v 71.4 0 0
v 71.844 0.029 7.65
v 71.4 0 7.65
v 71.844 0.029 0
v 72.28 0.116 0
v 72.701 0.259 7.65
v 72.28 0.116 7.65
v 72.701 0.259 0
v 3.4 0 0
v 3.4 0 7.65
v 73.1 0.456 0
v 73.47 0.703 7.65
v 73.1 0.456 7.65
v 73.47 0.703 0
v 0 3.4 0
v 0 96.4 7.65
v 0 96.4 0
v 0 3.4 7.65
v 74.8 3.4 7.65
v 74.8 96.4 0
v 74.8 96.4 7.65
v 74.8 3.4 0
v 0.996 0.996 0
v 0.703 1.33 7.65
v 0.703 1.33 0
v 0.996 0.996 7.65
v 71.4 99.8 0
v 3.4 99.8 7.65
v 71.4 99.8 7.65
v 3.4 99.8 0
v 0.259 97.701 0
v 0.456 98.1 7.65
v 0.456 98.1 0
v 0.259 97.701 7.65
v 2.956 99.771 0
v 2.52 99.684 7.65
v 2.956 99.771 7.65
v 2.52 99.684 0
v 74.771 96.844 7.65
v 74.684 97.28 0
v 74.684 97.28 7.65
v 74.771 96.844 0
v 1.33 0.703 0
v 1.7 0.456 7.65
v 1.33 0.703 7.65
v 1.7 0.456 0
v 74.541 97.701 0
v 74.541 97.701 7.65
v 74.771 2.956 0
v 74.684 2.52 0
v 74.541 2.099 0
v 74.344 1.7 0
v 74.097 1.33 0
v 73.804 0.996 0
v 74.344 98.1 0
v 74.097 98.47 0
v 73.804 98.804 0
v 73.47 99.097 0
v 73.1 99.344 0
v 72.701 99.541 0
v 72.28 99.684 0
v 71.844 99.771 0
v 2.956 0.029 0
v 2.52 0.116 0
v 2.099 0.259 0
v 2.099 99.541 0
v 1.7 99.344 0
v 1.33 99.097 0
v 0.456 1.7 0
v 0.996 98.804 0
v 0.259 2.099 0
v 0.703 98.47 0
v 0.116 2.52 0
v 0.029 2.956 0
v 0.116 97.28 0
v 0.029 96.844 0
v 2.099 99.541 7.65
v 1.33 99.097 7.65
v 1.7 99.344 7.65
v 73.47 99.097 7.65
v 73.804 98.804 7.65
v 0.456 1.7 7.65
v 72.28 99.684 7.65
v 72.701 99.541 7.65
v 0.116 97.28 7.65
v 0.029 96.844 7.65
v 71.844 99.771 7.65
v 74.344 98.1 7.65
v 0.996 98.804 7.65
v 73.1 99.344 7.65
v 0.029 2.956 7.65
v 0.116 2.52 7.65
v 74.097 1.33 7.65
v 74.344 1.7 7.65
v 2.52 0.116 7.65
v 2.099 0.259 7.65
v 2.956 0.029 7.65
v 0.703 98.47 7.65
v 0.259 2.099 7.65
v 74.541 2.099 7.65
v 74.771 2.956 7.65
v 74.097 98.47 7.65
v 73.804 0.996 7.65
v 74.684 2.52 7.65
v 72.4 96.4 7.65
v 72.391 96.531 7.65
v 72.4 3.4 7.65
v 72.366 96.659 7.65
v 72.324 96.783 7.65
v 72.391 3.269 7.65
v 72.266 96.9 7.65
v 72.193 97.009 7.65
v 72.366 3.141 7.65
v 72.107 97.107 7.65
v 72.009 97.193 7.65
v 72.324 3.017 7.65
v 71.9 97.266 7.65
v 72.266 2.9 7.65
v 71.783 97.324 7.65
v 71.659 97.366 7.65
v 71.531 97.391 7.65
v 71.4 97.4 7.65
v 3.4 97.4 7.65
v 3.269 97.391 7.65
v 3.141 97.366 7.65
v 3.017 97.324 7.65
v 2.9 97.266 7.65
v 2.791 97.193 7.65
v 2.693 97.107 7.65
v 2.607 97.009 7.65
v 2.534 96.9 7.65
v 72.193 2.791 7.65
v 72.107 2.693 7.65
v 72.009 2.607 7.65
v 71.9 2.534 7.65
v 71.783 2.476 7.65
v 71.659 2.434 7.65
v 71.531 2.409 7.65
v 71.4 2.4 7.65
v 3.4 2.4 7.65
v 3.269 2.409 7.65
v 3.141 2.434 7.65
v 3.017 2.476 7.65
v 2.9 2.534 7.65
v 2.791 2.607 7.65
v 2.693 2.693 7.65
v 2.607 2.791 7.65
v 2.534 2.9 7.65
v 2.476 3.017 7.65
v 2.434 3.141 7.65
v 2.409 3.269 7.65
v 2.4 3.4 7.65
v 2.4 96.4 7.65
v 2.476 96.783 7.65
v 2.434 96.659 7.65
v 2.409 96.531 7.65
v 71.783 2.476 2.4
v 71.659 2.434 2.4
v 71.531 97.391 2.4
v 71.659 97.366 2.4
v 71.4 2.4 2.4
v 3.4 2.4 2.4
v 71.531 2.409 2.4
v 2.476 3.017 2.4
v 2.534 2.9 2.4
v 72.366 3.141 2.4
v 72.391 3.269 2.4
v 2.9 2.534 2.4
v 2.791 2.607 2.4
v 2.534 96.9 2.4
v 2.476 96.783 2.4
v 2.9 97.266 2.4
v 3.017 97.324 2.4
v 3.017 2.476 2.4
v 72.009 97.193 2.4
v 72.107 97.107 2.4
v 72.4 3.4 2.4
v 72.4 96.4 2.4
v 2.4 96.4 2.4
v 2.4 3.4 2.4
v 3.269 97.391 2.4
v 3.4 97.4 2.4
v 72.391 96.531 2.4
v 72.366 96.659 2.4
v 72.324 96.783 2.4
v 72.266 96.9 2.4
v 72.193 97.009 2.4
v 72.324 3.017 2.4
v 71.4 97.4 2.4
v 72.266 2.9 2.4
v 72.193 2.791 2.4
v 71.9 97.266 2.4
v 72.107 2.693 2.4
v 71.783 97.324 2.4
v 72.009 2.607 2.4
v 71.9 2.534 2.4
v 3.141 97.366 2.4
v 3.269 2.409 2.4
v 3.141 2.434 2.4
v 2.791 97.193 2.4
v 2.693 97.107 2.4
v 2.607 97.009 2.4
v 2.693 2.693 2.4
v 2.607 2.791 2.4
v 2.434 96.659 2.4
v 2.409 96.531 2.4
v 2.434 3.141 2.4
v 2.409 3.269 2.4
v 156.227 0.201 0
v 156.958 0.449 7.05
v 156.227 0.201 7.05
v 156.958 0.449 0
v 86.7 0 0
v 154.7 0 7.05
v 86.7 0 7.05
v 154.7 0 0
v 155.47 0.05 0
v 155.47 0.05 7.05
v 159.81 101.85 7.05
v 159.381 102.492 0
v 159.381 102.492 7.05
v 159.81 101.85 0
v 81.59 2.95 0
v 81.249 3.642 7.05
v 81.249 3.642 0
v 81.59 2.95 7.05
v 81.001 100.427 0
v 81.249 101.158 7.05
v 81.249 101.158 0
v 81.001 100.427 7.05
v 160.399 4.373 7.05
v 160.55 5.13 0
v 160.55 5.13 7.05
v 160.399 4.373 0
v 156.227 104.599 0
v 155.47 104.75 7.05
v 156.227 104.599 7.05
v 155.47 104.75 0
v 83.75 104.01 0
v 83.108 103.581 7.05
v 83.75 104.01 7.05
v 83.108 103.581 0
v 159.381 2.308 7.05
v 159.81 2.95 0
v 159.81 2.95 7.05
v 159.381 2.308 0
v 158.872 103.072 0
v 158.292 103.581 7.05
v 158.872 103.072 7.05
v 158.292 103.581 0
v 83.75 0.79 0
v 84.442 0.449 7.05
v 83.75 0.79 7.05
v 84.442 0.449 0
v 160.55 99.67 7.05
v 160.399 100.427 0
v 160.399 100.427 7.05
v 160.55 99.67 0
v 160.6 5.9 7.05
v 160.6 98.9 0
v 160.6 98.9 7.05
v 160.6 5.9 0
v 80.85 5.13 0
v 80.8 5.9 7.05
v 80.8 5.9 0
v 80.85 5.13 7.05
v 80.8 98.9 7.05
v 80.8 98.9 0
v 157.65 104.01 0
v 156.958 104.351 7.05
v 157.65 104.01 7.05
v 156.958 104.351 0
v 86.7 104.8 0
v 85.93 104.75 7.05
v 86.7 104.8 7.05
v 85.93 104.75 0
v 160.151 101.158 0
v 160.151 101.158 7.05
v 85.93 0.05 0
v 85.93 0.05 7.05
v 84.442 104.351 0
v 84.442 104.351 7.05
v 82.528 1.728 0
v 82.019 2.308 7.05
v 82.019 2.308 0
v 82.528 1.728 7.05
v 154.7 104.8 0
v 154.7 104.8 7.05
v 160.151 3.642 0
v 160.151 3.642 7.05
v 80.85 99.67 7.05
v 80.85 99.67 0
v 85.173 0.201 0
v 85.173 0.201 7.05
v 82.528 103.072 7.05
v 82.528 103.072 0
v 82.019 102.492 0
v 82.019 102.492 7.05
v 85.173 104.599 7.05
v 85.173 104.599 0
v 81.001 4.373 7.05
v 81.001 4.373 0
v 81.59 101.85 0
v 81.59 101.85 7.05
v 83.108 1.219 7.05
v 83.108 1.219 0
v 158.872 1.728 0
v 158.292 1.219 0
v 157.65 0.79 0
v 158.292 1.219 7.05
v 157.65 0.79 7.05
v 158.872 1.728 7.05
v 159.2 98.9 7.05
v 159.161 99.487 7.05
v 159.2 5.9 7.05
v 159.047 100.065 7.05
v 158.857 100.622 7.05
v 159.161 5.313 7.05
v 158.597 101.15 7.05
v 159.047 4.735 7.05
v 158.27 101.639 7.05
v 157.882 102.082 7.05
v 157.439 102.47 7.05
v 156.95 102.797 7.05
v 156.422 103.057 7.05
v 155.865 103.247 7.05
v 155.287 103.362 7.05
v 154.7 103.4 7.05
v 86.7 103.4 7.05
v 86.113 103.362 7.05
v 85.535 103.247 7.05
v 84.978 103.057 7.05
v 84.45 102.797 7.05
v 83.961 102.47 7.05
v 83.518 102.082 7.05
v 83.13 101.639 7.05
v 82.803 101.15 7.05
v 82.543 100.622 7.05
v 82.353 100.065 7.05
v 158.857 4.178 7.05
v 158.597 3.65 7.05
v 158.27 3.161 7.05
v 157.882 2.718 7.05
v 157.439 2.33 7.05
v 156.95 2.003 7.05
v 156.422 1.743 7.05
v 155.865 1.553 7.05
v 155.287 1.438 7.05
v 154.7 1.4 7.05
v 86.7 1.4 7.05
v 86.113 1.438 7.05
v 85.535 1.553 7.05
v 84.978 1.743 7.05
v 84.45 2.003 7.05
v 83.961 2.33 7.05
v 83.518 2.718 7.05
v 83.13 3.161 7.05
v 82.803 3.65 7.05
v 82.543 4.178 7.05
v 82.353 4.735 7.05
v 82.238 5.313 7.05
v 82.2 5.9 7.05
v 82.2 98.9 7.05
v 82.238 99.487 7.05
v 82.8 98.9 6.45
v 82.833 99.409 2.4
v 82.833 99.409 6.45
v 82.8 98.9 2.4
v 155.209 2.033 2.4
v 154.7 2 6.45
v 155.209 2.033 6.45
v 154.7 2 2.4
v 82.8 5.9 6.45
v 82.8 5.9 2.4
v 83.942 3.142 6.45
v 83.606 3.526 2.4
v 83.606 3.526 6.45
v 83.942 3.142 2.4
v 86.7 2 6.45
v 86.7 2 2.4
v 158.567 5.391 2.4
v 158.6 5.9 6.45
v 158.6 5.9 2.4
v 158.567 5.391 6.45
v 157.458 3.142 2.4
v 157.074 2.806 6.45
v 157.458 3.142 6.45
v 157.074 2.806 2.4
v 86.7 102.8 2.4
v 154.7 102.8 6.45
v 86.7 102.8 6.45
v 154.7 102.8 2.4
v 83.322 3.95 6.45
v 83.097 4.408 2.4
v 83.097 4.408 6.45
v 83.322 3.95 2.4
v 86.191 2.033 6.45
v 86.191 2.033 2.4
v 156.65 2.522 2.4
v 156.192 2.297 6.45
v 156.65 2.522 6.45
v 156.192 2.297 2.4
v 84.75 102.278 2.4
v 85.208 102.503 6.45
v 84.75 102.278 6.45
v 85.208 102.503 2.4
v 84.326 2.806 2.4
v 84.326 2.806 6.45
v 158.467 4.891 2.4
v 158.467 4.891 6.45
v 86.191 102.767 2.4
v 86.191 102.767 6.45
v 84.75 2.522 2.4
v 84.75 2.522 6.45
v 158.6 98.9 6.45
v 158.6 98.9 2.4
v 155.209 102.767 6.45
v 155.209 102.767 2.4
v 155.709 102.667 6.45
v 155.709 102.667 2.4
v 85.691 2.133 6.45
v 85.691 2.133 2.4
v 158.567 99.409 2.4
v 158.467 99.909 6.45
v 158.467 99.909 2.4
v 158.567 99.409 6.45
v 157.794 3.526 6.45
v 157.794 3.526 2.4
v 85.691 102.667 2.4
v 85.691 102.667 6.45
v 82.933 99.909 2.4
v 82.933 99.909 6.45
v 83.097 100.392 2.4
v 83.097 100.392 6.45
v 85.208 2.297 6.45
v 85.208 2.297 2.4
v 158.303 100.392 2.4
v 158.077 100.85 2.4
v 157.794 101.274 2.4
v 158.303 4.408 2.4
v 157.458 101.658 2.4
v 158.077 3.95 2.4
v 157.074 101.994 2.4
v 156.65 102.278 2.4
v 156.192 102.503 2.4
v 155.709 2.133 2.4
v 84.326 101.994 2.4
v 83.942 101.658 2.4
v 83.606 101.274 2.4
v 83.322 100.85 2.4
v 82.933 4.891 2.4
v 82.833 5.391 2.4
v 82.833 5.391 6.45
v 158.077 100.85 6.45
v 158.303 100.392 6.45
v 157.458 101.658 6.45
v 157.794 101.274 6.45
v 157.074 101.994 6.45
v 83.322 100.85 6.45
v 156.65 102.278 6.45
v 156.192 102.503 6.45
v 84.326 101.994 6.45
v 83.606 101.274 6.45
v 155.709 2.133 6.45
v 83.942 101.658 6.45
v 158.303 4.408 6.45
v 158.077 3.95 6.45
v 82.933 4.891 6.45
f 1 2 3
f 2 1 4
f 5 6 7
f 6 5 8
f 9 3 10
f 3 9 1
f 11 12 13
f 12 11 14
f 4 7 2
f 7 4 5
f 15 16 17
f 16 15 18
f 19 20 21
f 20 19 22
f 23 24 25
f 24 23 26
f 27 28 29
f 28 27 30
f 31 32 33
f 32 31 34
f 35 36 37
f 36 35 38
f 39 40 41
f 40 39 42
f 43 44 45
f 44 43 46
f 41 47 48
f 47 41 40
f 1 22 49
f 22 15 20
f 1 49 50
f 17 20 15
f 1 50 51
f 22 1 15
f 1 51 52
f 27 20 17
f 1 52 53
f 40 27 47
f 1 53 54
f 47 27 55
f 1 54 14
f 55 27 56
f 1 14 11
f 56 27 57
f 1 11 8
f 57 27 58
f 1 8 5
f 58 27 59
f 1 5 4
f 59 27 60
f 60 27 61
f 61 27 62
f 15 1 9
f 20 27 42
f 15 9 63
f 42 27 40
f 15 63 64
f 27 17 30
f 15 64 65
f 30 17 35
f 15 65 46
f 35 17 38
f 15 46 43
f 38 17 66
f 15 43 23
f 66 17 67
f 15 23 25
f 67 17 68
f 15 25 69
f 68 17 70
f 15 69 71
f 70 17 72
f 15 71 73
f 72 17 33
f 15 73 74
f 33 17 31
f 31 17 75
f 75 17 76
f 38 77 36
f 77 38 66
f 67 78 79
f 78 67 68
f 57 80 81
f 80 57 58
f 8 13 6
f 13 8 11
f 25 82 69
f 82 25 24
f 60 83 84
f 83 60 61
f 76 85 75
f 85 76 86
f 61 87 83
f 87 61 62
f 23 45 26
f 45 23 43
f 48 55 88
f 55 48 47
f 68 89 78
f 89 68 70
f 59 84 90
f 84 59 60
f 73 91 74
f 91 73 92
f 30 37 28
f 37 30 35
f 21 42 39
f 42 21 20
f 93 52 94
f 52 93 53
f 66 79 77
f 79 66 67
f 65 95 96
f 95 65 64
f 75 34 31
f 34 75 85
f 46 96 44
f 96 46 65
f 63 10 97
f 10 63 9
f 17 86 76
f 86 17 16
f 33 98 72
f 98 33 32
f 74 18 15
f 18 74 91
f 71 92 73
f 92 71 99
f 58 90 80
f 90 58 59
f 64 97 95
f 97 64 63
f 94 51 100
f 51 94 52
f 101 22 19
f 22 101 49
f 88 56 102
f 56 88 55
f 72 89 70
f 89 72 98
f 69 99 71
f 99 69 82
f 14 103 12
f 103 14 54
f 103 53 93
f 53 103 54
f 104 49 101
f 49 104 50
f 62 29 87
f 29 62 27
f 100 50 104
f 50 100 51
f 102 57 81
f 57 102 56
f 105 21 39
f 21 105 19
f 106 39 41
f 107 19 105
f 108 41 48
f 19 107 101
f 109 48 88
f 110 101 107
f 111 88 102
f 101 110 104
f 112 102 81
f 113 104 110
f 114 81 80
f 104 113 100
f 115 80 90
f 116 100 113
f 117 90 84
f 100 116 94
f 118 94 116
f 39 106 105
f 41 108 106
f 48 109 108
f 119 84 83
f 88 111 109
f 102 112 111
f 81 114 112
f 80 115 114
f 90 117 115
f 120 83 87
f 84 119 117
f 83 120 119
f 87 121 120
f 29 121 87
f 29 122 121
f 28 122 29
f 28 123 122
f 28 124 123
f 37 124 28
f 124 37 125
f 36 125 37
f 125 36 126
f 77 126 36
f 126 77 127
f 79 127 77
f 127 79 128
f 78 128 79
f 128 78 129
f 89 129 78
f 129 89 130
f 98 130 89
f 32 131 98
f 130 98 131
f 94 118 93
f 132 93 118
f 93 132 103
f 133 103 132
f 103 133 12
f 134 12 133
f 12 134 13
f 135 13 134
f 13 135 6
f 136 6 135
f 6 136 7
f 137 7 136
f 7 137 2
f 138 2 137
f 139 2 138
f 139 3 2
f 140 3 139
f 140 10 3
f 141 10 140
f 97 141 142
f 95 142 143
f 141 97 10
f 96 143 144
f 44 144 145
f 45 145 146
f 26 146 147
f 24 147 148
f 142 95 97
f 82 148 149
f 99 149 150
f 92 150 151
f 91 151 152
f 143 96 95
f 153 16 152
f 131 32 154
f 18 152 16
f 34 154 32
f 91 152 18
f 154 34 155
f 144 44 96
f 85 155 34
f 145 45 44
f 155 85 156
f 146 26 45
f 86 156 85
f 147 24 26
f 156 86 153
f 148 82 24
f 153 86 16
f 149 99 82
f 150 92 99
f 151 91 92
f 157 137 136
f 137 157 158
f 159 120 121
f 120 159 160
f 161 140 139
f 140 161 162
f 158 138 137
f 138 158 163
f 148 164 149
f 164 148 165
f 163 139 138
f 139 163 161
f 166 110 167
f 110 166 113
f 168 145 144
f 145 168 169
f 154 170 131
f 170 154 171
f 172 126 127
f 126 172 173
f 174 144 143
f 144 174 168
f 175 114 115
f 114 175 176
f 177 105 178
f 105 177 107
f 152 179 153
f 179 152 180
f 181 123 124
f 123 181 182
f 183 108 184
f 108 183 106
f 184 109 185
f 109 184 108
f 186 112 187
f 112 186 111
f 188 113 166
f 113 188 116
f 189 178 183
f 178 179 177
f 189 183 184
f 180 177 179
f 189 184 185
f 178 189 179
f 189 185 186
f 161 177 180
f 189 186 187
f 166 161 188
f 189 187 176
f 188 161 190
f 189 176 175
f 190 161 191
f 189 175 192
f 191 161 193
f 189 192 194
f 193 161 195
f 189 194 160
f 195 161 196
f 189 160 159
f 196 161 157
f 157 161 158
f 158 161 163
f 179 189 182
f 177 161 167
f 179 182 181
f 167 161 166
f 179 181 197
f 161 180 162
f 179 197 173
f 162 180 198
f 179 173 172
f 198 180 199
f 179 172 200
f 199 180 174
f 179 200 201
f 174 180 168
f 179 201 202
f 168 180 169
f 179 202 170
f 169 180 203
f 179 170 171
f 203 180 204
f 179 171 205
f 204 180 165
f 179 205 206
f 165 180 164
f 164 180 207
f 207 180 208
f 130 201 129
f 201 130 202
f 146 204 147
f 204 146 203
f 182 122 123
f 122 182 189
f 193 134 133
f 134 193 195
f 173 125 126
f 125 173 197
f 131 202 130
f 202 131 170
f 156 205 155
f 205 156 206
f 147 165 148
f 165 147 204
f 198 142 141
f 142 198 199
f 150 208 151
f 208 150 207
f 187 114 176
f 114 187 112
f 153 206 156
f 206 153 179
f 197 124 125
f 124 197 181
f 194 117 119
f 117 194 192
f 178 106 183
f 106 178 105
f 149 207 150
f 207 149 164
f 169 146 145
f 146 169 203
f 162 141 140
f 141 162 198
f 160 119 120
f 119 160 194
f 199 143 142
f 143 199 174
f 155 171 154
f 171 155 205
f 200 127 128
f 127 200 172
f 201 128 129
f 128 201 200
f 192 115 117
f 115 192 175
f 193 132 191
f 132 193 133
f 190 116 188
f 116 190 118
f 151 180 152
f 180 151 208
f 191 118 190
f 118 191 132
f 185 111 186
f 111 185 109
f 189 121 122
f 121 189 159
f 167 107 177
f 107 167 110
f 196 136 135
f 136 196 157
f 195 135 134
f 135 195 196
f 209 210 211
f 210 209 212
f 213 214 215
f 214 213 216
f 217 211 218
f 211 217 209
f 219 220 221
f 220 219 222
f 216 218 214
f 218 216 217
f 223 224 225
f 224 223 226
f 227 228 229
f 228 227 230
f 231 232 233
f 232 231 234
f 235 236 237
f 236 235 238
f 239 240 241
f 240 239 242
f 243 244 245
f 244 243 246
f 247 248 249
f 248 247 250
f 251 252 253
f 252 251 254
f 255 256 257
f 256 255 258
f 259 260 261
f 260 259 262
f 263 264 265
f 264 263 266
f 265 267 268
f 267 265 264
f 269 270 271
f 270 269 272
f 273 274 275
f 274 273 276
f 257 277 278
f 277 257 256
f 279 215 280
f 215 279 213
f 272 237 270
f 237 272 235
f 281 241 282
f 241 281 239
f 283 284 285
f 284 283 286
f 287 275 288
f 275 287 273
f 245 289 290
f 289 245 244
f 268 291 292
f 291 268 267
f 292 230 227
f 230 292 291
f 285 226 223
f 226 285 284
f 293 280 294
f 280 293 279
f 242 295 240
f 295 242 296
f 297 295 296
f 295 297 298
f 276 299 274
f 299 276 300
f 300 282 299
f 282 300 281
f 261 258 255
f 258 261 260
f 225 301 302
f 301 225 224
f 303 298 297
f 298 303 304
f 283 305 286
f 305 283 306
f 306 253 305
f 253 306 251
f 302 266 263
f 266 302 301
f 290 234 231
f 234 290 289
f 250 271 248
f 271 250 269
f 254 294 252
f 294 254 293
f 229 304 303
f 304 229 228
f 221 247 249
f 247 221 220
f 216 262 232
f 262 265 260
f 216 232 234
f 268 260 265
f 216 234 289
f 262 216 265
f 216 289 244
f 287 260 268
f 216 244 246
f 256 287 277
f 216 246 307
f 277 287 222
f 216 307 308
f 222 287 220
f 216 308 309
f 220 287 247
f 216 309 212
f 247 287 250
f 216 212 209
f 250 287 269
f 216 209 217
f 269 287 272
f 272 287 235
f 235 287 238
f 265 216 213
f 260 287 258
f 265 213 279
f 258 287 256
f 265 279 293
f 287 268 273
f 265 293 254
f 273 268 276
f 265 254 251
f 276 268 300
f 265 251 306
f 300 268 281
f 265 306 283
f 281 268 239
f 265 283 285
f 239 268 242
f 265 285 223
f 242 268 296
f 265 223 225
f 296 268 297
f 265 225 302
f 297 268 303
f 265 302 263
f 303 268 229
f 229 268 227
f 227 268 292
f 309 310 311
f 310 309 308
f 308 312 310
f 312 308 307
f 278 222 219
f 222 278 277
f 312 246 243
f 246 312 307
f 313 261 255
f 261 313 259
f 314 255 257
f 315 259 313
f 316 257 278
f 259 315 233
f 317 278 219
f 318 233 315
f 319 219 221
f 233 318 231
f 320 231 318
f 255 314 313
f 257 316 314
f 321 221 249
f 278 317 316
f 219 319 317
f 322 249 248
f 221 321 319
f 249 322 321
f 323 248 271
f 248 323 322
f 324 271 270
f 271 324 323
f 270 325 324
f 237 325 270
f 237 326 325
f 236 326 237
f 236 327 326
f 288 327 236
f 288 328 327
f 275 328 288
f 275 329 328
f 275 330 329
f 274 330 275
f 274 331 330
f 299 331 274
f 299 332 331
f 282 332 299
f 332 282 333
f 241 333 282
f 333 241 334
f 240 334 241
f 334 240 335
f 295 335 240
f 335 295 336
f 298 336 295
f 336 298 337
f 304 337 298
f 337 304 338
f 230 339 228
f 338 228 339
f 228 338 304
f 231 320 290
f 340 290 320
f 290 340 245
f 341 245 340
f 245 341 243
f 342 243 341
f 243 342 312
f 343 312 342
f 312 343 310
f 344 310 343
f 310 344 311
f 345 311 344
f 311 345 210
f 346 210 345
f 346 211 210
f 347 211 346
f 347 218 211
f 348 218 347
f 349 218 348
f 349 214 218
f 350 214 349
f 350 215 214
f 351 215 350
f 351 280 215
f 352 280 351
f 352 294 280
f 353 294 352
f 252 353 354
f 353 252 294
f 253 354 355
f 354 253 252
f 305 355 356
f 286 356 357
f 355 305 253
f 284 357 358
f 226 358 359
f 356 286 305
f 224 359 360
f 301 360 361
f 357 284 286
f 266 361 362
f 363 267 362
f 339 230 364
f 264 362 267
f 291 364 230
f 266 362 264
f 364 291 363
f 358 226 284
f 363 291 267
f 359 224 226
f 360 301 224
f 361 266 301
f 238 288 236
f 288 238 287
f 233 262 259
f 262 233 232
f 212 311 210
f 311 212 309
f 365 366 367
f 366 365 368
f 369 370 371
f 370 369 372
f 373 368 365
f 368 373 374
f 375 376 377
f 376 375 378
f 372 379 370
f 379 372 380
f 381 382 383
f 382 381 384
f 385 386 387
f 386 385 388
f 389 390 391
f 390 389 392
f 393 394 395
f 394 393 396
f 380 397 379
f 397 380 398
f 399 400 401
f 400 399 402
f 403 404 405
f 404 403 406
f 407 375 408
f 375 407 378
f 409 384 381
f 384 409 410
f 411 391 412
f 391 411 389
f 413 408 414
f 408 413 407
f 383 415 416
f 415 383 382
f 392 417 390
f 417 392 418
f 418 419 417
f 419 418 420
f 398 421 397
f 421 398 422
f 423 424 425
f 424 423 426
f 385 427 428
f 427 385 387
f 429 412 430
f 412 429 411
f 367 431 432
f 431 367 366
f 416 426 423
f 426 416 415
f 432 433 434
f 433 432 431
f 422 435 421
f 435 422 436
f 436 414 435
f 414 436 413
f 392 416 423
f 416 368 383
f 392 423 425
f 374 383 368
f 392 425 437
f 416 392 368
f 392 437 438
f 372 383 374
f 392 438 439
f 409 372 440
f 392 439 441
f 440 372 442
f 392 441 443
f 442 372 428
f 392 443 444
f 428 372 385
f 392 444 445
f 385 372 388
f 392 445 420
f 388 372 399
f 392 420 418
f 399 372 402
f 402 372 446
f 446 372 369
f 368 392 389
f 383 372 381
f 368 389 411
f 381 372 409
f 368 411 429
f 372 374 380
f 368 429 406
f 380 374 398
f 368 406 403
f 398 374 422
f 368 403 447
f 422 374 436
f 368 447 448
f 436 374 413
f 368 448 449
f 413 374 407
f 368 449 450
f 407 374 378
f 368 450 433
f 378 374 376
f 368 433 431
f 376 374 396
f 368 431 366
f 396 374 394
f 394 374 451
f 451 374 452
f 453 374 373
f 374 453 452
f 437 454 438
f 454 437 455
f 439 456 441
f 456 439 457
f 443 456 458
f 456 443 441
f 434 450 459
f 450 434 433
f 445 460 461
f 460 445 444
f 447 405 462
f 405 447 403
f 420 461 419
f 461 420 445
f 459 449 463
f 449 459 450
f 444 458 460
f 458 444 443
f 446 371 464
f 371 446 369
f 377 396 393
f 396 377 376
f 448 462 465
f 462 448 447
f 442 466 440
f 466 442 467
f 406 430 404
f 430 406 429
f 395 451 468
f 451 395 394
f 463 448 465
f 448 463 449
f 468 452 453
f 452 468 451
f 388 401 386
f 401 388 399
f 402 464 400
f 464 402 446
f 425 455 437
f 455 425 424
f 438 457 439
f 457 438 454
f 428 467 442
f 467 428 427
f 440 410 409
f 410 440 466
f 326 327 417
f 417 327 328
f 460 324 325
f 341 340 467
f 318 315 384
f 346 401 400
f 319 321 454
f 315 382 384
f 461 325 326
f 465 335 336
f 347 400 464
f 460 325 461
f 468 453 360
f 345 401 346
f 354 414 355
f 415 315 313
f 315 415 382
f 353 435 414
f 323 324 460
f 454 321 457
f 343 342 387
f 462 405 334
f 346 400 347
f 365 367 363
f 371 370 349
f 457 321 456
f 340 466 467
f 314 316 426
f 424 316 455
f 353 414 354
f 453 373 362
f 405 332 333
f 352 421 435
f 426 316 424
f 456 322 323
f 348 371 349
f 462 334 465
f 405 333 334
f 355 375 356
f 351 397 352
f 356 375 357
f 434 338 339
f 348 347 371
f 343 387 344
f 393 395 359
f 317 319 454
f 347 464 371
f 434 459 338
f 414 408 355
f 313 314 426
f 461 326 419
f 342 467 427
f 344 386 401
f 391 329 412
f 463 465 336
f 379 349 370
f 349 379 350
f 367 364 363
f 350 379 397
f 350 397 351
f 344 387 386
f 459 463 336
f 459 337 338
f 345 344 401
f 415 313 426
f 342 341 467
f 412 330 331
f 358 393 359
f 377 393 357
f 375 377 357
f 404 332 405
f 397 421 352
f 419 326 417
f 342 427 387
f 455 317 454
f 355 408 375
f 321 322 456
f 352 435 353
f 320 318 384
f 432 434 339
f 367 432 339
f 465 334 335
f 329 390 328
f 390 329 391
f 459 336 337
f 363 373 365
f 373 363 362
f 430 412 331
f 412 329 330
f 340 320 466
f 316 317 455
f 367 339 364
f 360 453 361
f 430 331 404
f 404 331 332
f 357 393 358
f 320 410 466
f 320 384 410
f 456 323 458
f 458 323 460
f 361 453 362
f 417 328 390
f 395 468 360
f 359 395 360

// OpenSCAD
/*
Card-mailer-01: estojos internos de transporte, 3/10 sleeves ou UMA slab BGS.
Colocar fita macia de retirada sob o conteudo, forro removivel de 1 mm embaixo
 e em cima; dobrar pontas da fita para dentro. Retirar levantando ambas pontas,
sem curvar os cards. Tampa sobreposta solta: LACRAR com fita em dois sentidos.
Usar dentro de embalagem externa de papelao com amortecimento; nao estanque.
Medidas reutilizadas por autorizacao do usuario: deckbox-03, 60 cards 68x93x45;
espessuras 2.25/7.5 sao ESTIMATIVAS proporcionais. BGS: bgs-stand-01, medida
real 82.5x130.2x8.5. Nao afirma compatibilidade PSA/CGC nem toploader.
Comandos canonicos (caminhos absolutos, repetir variant para cards3/cards10/bgs):
flatpak run org.openscad.OpenSCAD -o /home/afonsolelis/repos/3dmodels/deckboxes/card-mailer-01/stl/cards3-base.stl -D 'variant="cards3"' -D 'part="base"' /home/afonsolelis/repos/3dmodels/deckboxes/card-mailer-01/card-mailer-01.scad
flatpak run org.openscad.OpenSCAD -o /home/afonsolelis/repos/3dmodels/deckboxes/card-mailer-01/stl/cards3-lid.stl -D 'variant="cards3"' -D 'part="lid"' /home/afonsolelis/repos/3dmodels/deckboxes/card-mailer-01/card-mailer-01.scad
flatpak run org.openscad.OpenSCAD -o /home/afonsolelis/repos/3dmodels/deckboxes/card-mailer-01/3mf/cards3.3mf -D 'variant="cards3"' -D 'part="plate"' /home/afonsolelis/repos/3dmodels/deckboxes/card-mailer-01/card-mailer-01.scad
Base boca para cima; tampa teto na mesa e boca para cima. Sem suportes.
Curso vertical total = overlap: nao ha gancho nem trava, folga constante;
levantamento >= overlap libera tampa. Batente e o aro superior da base.
*/
/* [Selecao] */
variant = is_undef(variant_override) ? "cards3" : variant_override; // cards3, cards10, bgs
part = "plate"; // base, lid, plate, assembled
/* [Objeto medido] */
card_w = 68; // mm, largura sleeved real
card_l = 93; // mm, comprimento sleeved real
card_t = 45/60; // mm/card ESTIMADO a partir de deck real de 60
slab_w = 82.5; // mm, BGS real
slab_l = 130.2; // mm, BGS real
slab_t = 8.5; // mm, BGS real
/* [Protecao e encaixe] */
content_clear = 1; // mm/lado, folga horizontal do conteudo
padding = 1; // mm POR FACE: duas folhas macias removiveis
headroom = 1; // mm, reserva vertical para fita de retirada e folga
wall = 2.4; // mm, parede da base
floor_t = 2.4; // mm, fundo rigido
roof_t = 2.4; // mm, teto rigido
skirt_t = 2; // mm, saia da tampa
fit = 0.5; // mm/lado, folga de deslize
mouth = 0.6; // mm, chanfro de entrada 45 graus
base_grip = 3; // mm, faixa inferior exposta para segurar base
plate_gap = 6; // mm, vao entre base e tampa
/* [Hidden] */
$fn=48;
eps=0.01;
// Derivados
is_slab = variant == "bgs";
n = variant == "cards10" ? 10 : 3;
w = is_slab ? slab_w : card_w;
l = is_slab ? slab_l : card_l;
t = is_slab ? slab_t : n*card_t;
iw=w+2*content_clear;
il=l+2*content_clear;
depth=t+2*padding+headroom;
bw=iw+2*wall;
bl=il+2*wall;
bh=floor_t+depth;
br=wall+1;
lw=bw+2*(fit+skirt_t);
ll=bl+2*(fit+skirt_t);
lr=br+fit+skirt_t;
overlap=bh-base_grip;
lh=roof_t+overlap;
assert(variant=="cards3" || variant=="cards10" || variant=="bgs");
assert(fit>=0.5 && overlap>mouth && skirt_t-mouth>=1.2);
assert(lw+bw+plate_gap<=210 && ll<=210);
echo(variant=variant, content=[w,l,t], cavity=[iw,il,depth], base=[bw,bl,bh], lid=[lw,ll,lh], assembled=[lw,ll,bh+roof_t], opening_stroke=overlap, plate=[bw+plate_gap+lw,ll,max(bh,lh)], fit_per_side=fit);
module rr(w,l,r) { translate([r,r]) offset(r=r) square([w-2*r,l-2*r]); }
module prism(w,l,r,h) { linear_extrude(height=h) rr(w,l,r); }
module base() {
 difference() {
  prism(bw,bl,br,bh);
  translate([wall,wall,floor_t]) prism(iw,il,1,depth+eps);
 }
}
module lid() {
 difference() {
  prism(lw,ll,lr,lh);
  translate([skirt_t,skirt_t,roof_t]) prism(bw+2*fit,bl+2*fit,br+fit,overlap+eps);
  hull() {
   translate([skirt_t,skirt_t,lh-mouth]) prism(bw+2*fit,bl+2*fit,br+fit,eps);
   translate([skirt_t-mouth,skirt_t-mouth,lh]) prism(bw+2*fit+2*mouth,bl+2*fit+2*mouth,br+fit+mouth,eps);
  }
 }
}
if(part=="base") base();
else if(part=="lid") lid();
else if(part=="plate") { base(); translate([bw+plate_gap,0,0]) lid(); }
else if(part=="assembled") { base(); translate([-fit-skirt_t,ll-fit-skirt_t,bh+roof_t]) rotate([180,0,0]) lid(); }
else assert(false,"part desconhecida");
